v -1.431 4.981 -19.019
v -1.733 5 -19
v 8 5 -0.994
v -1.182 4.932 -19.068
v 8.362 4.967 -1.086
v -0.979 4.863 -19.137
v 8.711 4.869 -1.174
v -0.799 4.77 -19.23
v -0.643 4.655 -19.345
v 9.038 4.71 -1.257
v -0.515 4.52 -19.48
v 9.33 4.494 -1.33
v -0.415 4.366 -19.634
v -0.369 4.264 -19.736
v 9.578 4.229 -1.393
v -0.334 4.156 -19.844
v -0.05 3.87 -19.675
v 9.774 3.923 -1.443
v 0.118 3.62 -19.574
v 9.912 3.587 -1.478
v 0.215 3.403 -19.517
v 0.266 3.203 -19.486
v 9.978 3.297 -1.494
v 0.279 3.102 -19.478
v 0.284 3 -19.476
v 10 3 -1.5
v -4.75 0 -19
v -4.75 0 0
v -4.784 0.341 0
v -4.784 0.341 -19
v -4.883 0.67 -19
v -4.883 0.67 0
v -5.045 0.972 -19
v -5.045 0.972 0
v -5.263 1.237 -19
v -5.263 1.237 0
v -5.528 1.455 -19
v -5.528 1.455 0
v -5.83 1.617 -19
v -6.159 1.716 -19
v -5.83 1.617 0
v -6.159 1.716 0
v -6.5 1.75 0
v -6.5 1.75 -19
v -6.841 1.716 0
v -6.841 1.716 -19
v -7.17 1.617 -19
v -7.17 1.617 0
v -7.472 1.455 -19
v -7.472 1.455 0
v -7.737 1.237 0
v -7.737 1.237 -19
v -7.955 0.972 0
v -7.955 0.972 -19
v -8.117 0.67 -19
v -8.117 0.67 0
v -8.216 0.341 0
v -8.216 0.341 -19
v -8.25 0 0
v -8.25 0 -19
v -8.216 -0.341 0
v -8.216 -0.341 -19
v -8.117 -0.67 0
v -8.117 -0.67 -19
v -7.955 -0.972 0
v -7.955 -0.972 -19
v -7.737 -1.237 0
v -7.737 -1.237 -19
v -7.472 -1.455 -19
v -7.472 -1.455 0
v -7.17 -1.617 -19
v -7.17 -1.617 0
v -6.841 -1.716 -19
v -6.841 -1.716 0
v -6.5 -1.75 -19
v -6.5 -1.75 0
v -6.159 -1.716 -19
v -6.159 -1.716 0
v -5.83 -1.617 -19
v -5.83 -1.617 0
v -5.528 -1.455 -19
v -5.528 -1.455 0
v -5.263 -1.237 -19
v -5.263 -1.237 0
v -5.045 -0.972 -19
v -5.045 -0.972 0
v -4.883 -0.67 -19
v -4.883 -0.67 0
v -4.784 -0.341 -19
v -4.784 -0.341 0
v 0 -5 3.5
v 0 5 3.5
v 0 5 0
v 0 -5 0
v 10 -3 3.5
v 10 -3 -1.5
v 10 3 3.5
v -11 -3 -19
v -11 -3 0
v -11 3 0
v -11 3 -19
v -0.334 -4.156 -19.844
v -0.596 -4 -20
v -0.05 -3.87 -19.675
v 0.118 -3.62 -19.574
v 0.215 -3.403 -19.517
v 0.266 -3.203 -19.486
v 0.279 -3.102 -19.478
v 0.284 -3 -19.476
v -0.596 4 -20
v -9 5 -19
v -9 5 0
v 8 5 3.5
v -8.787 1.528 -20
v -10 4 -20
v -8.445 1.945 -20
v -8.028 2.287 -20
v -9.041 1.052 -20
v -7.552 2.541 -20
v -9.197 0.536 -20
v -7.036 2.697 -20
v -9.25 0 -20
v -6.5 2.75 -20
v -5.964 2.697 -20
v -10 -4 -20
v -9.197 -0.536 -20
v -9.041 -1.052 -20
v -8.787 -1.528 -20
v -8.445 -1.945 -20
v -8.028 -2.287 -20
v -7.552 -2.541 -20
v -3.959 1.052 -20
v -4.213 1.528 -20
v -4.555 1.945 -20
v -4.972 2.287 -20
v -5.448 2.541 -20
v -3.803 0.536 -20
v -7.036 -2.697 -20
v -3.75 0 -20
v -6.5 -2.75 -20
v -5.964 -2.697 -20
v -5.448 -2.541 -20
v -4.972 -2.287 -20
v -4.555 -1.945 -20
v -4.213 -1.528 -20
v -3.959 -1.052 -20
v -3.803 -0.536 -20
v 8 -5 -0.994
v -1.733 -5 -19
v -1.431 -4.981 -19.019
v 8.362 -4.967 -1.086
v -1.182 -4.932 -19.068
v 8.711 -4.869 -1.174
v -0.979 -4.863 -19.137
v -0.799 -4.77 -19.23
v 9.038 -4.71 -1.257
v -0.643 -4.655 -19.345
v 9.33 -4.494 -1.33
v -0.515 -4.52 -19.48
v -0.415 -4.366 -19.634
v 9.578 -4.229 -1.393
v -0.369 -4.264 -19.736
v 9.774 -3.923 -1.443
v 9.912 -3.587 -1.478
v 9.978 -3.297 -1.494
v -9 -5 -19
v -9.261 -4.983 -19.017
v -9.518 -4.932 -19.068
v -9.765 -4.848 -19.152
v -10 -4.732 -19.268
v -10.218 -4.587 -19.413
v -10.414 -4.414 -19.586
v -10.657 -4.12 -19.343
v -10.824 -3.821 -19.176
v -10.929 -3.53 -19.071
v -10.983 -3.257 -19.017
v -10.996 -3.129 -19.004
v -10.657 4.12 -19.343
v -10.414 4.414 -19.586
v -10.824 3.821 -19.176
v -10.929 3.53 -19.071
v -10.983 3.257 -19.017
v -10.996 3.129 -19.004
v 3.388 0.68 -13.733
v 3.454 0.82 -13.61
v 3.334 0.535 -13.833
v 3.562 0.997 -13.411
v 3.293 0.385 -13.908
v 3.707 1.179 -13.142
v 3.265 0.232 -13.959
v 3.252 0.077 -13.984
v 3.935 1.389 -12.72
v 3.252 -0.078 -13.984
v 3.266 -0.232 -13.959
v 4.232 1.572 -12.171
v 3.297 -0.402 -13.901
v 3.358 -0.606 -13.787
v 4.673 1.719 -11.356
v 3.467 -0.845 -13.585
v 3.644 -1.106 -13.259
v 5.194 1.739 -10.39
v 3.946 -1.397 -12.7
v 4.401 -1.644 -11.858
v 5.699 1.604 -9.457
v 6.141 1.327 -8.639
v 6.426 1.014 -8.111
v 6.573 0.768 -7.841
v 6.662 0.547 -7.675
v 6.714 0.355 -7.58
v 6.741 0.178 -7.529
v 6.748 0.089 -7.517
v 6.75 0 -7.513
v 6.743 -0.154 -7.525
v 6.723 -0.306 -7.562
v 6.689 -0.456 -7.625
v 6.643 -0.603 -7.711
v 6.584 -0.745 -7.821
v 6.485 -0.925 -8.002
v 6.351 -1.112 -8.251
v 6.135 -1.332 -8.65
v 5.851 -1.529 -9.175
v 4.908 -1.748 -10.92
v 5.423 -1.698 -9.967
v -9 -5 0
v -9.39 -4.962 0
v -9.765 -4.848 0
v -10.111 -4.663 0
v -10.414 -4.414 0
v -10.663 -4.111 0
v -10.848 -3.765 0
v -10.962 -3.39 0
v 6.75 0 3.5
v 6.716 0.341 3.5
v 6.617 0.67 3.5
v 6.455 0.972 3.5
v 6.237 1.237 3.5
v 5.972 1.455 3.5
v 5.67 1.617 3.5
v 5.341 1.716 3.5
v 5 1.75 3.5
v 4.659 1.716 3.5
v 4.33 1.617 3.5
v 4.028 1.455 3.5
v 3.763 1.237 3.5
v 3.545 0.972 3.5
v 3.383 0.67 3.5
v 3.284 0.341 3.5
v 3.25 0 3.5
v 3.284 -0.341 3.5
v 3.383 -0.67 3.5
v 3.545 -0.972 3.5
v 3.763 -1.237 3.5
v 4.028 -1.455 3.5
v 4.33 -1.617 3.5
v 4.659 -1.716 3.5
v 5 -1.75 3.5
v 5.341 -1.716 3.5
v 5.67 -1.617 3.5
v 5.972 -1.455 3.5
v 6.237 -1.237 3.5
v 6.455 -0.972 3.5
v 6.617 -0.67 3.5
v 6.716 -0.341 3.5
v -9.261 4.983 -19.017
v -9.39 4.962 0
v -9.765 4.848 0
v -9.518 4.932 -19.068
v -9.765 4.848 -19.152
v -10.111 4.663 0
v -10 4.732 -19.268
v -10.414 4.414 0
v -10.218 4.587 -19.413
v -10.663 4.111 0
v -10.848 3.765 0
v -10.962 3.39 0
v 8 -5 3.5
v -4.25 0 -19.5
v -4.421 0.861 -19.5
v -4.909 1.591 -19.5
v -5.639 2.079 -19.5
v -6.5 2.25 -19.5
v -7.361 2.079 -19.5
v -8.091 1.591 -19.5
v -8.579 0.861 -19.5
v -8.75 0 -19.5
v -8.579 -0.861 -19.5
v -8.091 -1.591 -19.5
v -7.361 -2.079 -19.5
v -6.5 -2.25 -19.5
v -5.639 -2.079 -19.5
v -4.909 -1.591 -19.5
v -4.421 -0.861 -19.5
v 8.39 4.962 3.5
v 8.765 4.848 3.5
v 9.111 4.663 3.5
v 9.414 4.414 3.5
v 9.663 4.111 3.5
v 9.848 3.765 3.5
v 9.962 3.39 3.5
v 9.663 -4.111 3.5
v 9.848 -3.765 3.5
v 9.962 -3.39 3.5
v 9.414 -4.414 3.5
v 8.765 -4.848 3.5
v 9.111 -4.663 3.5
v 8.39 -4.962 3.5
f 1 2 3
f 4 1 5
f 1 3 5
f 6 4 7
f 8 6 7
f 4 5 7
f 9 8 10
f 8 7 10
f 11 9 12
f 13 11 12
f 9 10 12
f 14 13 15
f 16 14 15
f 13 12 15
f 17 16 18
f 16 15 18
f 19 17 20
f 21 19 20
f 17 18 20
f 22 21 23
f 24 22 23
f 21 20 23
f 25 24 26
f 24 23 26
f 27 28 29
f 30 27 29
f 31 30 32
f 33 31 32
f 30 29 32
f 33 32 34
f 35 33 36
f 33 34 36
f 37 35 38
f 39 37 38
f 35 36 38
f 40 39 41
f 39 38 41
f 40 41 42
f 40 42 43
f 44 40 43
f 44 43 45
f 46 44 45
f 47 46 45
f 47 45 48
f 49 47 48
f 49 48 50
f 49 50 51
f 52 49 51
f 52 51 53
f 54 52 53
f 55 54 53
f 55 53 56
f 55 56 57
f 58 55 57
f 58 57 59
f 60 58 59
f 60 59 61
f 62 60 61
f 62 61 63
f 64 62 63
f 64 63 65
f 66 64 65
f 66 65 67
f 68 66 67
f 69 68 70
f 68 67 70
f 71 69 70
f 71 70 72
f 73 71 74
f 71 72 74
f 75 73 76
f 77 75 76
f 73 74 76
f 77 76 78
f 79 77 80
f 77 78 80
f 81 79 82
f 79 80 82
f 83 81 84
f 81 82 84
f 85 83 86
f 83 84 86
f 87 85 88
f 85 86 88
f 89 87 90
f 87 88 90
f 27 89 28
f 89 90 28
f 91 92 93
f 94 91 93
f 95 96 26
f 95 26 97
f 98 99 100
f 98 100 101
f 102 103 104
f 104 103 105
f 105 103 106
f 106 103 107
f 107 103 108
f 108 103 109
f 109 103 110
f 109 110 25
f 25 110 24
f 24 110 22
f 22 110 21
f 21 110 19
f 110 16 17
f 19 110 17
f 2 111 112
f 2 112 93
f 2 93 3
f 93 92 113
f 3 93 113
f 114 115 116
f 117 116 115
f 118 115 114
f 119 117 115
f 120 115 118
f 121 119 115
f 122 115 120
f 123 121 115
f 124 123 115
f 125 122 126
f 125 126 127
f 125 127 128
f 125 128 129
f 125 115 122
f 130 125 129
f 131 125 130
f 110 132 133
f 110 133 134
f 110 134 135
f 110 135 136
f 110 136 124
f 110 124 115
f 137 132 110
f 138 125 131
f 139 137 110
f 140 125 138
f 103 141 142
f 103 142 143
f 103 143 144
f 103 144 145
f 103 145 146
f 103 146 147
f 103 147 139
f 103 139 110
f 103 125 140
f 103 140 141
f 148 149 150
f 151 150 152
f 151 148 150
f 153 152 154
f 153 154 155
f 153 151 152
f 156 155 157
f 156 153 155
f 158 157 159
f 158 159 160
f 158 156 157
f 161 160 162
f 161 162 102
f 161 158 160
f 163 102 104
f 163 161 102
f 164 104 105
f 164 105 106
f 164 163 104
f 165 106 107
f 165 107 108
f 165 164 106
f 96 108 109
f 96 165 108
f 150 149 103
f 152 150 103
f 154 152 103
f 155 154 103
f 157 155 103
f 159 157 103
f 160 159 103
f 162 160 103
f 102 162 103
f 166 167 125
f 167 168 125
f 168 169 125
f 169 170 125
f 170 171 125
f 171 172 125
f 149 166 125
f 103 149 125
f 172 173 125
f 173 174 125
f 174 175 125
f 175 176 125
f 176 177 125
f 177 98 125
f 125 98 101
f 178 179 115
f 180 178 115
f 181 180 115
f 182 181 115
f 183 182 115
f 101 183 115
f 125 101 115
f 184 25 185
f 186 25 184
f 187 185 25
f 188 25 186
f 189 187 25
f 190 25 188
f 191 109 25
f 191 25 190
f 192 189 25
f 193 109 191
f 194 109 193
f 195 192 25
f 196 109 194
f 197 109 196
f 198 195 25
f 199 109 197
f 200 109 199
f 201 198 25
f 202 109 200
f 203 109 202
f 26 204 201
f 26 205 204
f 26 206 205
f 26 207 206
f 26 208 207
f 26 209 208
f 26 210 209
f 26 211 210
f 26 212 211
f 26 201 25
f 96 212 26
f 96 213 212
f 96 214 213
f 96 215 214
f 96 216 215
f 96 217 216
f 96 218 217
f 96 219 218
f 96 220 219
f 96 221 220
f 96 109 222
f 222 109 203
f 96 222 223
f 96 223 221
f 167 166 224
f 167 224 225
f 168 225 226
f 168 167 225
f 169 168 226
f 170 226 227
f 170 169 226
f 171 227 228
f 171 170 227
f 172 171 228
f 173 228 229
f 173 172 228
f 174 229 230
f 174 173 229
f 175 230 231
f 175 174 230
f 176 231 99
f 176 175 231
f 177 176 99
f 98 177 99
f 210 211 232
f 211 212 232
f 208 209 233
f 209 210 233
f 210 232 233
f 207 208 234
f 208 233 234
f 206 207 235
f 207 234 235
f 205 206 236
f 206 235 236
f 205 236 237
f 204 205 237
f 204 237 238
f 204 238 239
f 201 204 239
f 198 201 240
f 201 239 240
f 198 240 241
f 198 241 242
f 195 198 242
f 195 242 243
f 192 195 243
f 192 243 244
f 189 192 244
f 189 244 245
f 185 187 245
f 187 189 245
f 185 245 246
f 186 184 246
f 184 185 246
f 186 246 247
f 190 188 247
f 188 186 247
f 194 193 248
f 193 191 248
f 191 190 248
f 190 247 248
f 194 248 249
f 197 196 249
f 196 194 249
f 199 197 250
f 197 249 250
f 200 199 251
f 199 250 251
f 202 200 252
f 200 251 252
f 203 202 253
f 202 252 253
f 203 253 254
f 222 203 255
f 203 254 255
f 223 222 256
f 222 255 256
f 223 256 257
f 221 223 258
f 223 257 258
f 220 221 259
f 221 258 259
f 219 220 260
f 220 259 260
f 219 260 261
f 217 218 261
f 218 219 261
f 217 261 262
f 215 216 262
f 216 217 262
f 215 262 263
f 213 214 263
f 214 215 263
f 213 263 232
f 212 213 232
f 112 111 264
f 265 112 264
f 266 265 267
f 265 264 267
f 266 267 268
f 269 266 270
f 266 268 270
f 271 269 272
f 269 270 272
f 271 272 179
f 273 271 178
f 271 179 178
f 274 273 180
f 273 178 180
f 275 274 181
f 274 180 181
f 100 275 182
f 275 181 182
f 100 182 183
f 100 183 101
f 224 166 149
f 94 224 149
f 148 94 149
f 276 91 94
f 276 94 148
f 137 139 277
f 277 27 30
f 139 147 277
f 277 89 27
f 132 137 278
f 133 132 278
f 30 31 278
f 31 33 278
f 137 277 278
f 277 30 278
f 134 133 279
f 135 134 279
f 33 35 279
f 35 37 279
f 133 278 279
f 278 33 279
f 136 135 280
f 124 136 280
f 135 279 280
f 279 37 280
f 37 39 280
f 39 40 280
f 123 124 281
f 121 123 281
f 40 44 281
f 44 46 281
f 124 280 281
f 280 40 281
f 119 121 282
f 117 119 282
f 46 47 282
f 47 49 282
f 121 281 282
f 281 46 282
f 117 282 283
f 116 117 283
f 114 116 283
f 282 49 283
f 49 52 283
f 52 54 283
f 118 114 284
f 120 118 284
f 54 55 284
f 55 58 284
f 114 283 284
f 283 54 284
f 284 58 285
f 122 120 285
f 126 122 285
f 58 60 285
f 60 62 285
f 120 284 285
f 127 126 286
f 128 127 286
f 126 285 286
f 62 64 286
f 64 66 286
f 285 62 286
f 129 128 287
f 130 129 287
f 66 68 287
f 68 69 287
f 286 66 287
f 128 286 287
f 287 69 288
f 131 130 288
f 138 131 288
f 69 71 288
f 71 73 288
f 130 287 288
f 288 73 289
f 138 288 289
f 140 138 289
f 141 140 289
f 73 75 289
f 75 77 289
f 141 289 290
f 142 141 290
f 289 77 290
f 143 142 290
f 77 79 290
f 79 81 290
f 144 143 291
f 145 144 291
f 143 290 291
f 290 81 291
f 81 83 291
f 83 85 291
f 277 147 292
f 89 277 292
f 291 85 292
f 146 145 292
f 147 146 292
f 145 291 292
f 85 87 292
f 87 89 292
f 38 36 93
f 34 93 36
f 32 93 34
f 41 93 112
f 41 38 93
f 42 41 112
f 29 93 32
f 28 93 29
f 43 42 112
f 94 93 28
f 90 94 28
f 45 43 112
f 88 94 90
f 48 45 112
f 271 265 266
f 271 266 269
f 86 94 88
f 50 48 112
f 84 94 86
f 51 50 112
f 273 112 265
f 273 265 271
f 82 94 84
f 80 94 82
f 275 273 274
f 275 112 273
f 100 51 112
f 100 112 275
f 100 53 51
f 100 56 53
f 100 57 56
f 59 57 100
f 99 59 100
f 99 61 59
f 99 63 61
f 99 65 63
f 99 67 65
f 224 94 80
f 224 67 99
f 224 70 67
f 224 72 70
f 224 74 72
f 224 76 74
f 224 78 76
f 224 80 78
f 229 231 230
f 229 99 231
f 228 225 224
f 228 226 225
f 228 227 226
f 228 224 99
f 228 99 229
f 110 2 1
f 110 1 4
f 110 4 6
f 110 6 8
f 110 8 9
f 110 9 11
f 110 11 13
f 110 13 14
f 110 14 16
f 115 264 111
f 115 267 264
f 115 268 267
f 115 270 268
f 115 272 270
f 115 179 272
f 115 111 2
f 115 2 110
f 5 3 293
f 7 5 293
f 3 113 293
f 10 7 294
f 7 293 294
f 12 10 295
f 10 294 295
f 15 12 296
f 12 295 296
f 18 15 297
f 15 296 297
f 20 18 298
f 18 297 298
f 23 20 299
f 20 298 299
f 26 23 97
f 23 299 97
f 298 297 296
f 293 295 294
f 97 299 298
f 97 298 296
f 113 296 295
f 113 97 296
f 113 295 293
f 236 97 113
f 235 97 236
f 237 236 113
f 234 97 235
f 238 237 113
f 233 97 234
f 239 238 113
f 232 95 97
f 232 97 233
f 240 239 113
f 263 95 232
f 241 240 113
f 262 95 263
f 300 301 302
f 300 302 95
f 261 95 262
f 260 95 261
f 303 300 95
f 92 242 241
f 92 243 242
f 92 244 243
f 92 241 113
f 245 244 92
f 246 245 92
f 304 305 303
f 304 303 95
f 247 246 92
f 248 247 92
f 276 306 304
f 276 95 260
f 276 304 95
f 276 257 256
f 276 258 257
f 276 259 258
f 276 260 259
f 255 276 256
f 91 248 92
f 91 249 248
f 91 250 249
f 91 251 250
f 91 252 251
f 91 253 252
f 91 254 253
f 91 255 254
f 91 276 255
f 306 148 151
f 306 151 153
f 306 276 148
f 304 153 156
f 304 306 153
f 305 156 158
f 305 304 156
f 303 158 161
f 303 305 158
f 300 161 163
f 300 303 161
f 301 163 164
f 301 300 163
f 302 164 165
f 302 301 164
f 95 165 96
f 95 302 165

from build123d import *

# Parameters (mm, degrees)
F1_DEPTH    = 5
F2_R        = 1.75
F3_DEPTH    = 23.501
F4_T1_DEPTH = 15.1433659759
F4_T3_DEPTH = 16.1433659759
F4_T5_DEPTH = 13.1544598894
F5_R        = 2


# Not quite as in the source:
# - a fillet or chamfer that OpenCascade refuses, or shapes differently, is made with other operations: its cross-section is extruded or revolved along the edge and cut away or added


with BuildPart() as f1:
    # F0 (on Front) → F1 (new body, symmetric)
    with BuildSketch(Plane.XZ):
        Polygon((0, 3.5), (0, 0), (-11, 0), (-11, -20), (0, -20), (10, -1.5), (10, 3.5), align=None)
    extrude(amount=F1_DEPTH, both=True)

    # F2 (on face) → F3 (cut, through all)
    with BuildSketch(Plane.XY.offset(3.5)):
        with Locations((-6.5, 0)):
            Circle(F2_R)
        with Locations((5, 0)):
            Circle(F2_R)
    extrude(amount=-F3_DEPTH, mode=Mode.SUBTRACT)

    # F4: chamfer of 1 on 5 edges, made by hand

    # F4_s2 → F4_t1 (cut)
    with BuildSketch(Plane.XZ.offset(-7.571682988)):
        Polygon((-11, -19), (-10, -20), (-11, -20), align=None)
    extrude(amount=F4_T1_DEPTH, mode=Mode.SUBTRACT)

    # F4_s4 → F4_t3 (cut)
    with BuildSketch(Plane.YZ.offset(-13.571682988)):
        Polygon((5, -19), (4, -20), (5, -20), align=None)
        Polygon((-5, -19), (-4, -20), (-5, -20), align=None)
    extrude(amount=F4_T3_DEPTH, mode=Mode.SUBTRACT)

    # F4_s6 → F4_t5 (cut)
    with BuildSketch(Plane.XZ.offset(-6.5772299447)):
        Polygon((-0.5962022078, -20), (0.2835043057, -19.4755170344), (0, -20), align=None)
    extrude(amount=F4_T5_DEPTH, mode=Mode.SUBTRACT)

    # F4_s7 → F4_t8 (revolve, cut)
    with BuildSketch(Plane.XZ):
        Polygon((-3.75, -20), (-4.75, -19), (-4.75, -20), align=None)
    revolve(axis=Axis((-6.5, 0, -20), (0, 0, 1)), mode=Mode.SUBTRACT)

    # F5
    f5_edges = [f1.edges().sort_by_distance(p)[0] for p in [
        (-11, -5, -9.5),
        (-11, 5, -9.5),
        (5.27027, -5, -10.25),
        (10, -5, 1),
        (10, 5, 1),
        (5.27027, 5, -10.25),
    ]]
    fillet(f5_edges, radius=F5_R)


solid = f1.part
